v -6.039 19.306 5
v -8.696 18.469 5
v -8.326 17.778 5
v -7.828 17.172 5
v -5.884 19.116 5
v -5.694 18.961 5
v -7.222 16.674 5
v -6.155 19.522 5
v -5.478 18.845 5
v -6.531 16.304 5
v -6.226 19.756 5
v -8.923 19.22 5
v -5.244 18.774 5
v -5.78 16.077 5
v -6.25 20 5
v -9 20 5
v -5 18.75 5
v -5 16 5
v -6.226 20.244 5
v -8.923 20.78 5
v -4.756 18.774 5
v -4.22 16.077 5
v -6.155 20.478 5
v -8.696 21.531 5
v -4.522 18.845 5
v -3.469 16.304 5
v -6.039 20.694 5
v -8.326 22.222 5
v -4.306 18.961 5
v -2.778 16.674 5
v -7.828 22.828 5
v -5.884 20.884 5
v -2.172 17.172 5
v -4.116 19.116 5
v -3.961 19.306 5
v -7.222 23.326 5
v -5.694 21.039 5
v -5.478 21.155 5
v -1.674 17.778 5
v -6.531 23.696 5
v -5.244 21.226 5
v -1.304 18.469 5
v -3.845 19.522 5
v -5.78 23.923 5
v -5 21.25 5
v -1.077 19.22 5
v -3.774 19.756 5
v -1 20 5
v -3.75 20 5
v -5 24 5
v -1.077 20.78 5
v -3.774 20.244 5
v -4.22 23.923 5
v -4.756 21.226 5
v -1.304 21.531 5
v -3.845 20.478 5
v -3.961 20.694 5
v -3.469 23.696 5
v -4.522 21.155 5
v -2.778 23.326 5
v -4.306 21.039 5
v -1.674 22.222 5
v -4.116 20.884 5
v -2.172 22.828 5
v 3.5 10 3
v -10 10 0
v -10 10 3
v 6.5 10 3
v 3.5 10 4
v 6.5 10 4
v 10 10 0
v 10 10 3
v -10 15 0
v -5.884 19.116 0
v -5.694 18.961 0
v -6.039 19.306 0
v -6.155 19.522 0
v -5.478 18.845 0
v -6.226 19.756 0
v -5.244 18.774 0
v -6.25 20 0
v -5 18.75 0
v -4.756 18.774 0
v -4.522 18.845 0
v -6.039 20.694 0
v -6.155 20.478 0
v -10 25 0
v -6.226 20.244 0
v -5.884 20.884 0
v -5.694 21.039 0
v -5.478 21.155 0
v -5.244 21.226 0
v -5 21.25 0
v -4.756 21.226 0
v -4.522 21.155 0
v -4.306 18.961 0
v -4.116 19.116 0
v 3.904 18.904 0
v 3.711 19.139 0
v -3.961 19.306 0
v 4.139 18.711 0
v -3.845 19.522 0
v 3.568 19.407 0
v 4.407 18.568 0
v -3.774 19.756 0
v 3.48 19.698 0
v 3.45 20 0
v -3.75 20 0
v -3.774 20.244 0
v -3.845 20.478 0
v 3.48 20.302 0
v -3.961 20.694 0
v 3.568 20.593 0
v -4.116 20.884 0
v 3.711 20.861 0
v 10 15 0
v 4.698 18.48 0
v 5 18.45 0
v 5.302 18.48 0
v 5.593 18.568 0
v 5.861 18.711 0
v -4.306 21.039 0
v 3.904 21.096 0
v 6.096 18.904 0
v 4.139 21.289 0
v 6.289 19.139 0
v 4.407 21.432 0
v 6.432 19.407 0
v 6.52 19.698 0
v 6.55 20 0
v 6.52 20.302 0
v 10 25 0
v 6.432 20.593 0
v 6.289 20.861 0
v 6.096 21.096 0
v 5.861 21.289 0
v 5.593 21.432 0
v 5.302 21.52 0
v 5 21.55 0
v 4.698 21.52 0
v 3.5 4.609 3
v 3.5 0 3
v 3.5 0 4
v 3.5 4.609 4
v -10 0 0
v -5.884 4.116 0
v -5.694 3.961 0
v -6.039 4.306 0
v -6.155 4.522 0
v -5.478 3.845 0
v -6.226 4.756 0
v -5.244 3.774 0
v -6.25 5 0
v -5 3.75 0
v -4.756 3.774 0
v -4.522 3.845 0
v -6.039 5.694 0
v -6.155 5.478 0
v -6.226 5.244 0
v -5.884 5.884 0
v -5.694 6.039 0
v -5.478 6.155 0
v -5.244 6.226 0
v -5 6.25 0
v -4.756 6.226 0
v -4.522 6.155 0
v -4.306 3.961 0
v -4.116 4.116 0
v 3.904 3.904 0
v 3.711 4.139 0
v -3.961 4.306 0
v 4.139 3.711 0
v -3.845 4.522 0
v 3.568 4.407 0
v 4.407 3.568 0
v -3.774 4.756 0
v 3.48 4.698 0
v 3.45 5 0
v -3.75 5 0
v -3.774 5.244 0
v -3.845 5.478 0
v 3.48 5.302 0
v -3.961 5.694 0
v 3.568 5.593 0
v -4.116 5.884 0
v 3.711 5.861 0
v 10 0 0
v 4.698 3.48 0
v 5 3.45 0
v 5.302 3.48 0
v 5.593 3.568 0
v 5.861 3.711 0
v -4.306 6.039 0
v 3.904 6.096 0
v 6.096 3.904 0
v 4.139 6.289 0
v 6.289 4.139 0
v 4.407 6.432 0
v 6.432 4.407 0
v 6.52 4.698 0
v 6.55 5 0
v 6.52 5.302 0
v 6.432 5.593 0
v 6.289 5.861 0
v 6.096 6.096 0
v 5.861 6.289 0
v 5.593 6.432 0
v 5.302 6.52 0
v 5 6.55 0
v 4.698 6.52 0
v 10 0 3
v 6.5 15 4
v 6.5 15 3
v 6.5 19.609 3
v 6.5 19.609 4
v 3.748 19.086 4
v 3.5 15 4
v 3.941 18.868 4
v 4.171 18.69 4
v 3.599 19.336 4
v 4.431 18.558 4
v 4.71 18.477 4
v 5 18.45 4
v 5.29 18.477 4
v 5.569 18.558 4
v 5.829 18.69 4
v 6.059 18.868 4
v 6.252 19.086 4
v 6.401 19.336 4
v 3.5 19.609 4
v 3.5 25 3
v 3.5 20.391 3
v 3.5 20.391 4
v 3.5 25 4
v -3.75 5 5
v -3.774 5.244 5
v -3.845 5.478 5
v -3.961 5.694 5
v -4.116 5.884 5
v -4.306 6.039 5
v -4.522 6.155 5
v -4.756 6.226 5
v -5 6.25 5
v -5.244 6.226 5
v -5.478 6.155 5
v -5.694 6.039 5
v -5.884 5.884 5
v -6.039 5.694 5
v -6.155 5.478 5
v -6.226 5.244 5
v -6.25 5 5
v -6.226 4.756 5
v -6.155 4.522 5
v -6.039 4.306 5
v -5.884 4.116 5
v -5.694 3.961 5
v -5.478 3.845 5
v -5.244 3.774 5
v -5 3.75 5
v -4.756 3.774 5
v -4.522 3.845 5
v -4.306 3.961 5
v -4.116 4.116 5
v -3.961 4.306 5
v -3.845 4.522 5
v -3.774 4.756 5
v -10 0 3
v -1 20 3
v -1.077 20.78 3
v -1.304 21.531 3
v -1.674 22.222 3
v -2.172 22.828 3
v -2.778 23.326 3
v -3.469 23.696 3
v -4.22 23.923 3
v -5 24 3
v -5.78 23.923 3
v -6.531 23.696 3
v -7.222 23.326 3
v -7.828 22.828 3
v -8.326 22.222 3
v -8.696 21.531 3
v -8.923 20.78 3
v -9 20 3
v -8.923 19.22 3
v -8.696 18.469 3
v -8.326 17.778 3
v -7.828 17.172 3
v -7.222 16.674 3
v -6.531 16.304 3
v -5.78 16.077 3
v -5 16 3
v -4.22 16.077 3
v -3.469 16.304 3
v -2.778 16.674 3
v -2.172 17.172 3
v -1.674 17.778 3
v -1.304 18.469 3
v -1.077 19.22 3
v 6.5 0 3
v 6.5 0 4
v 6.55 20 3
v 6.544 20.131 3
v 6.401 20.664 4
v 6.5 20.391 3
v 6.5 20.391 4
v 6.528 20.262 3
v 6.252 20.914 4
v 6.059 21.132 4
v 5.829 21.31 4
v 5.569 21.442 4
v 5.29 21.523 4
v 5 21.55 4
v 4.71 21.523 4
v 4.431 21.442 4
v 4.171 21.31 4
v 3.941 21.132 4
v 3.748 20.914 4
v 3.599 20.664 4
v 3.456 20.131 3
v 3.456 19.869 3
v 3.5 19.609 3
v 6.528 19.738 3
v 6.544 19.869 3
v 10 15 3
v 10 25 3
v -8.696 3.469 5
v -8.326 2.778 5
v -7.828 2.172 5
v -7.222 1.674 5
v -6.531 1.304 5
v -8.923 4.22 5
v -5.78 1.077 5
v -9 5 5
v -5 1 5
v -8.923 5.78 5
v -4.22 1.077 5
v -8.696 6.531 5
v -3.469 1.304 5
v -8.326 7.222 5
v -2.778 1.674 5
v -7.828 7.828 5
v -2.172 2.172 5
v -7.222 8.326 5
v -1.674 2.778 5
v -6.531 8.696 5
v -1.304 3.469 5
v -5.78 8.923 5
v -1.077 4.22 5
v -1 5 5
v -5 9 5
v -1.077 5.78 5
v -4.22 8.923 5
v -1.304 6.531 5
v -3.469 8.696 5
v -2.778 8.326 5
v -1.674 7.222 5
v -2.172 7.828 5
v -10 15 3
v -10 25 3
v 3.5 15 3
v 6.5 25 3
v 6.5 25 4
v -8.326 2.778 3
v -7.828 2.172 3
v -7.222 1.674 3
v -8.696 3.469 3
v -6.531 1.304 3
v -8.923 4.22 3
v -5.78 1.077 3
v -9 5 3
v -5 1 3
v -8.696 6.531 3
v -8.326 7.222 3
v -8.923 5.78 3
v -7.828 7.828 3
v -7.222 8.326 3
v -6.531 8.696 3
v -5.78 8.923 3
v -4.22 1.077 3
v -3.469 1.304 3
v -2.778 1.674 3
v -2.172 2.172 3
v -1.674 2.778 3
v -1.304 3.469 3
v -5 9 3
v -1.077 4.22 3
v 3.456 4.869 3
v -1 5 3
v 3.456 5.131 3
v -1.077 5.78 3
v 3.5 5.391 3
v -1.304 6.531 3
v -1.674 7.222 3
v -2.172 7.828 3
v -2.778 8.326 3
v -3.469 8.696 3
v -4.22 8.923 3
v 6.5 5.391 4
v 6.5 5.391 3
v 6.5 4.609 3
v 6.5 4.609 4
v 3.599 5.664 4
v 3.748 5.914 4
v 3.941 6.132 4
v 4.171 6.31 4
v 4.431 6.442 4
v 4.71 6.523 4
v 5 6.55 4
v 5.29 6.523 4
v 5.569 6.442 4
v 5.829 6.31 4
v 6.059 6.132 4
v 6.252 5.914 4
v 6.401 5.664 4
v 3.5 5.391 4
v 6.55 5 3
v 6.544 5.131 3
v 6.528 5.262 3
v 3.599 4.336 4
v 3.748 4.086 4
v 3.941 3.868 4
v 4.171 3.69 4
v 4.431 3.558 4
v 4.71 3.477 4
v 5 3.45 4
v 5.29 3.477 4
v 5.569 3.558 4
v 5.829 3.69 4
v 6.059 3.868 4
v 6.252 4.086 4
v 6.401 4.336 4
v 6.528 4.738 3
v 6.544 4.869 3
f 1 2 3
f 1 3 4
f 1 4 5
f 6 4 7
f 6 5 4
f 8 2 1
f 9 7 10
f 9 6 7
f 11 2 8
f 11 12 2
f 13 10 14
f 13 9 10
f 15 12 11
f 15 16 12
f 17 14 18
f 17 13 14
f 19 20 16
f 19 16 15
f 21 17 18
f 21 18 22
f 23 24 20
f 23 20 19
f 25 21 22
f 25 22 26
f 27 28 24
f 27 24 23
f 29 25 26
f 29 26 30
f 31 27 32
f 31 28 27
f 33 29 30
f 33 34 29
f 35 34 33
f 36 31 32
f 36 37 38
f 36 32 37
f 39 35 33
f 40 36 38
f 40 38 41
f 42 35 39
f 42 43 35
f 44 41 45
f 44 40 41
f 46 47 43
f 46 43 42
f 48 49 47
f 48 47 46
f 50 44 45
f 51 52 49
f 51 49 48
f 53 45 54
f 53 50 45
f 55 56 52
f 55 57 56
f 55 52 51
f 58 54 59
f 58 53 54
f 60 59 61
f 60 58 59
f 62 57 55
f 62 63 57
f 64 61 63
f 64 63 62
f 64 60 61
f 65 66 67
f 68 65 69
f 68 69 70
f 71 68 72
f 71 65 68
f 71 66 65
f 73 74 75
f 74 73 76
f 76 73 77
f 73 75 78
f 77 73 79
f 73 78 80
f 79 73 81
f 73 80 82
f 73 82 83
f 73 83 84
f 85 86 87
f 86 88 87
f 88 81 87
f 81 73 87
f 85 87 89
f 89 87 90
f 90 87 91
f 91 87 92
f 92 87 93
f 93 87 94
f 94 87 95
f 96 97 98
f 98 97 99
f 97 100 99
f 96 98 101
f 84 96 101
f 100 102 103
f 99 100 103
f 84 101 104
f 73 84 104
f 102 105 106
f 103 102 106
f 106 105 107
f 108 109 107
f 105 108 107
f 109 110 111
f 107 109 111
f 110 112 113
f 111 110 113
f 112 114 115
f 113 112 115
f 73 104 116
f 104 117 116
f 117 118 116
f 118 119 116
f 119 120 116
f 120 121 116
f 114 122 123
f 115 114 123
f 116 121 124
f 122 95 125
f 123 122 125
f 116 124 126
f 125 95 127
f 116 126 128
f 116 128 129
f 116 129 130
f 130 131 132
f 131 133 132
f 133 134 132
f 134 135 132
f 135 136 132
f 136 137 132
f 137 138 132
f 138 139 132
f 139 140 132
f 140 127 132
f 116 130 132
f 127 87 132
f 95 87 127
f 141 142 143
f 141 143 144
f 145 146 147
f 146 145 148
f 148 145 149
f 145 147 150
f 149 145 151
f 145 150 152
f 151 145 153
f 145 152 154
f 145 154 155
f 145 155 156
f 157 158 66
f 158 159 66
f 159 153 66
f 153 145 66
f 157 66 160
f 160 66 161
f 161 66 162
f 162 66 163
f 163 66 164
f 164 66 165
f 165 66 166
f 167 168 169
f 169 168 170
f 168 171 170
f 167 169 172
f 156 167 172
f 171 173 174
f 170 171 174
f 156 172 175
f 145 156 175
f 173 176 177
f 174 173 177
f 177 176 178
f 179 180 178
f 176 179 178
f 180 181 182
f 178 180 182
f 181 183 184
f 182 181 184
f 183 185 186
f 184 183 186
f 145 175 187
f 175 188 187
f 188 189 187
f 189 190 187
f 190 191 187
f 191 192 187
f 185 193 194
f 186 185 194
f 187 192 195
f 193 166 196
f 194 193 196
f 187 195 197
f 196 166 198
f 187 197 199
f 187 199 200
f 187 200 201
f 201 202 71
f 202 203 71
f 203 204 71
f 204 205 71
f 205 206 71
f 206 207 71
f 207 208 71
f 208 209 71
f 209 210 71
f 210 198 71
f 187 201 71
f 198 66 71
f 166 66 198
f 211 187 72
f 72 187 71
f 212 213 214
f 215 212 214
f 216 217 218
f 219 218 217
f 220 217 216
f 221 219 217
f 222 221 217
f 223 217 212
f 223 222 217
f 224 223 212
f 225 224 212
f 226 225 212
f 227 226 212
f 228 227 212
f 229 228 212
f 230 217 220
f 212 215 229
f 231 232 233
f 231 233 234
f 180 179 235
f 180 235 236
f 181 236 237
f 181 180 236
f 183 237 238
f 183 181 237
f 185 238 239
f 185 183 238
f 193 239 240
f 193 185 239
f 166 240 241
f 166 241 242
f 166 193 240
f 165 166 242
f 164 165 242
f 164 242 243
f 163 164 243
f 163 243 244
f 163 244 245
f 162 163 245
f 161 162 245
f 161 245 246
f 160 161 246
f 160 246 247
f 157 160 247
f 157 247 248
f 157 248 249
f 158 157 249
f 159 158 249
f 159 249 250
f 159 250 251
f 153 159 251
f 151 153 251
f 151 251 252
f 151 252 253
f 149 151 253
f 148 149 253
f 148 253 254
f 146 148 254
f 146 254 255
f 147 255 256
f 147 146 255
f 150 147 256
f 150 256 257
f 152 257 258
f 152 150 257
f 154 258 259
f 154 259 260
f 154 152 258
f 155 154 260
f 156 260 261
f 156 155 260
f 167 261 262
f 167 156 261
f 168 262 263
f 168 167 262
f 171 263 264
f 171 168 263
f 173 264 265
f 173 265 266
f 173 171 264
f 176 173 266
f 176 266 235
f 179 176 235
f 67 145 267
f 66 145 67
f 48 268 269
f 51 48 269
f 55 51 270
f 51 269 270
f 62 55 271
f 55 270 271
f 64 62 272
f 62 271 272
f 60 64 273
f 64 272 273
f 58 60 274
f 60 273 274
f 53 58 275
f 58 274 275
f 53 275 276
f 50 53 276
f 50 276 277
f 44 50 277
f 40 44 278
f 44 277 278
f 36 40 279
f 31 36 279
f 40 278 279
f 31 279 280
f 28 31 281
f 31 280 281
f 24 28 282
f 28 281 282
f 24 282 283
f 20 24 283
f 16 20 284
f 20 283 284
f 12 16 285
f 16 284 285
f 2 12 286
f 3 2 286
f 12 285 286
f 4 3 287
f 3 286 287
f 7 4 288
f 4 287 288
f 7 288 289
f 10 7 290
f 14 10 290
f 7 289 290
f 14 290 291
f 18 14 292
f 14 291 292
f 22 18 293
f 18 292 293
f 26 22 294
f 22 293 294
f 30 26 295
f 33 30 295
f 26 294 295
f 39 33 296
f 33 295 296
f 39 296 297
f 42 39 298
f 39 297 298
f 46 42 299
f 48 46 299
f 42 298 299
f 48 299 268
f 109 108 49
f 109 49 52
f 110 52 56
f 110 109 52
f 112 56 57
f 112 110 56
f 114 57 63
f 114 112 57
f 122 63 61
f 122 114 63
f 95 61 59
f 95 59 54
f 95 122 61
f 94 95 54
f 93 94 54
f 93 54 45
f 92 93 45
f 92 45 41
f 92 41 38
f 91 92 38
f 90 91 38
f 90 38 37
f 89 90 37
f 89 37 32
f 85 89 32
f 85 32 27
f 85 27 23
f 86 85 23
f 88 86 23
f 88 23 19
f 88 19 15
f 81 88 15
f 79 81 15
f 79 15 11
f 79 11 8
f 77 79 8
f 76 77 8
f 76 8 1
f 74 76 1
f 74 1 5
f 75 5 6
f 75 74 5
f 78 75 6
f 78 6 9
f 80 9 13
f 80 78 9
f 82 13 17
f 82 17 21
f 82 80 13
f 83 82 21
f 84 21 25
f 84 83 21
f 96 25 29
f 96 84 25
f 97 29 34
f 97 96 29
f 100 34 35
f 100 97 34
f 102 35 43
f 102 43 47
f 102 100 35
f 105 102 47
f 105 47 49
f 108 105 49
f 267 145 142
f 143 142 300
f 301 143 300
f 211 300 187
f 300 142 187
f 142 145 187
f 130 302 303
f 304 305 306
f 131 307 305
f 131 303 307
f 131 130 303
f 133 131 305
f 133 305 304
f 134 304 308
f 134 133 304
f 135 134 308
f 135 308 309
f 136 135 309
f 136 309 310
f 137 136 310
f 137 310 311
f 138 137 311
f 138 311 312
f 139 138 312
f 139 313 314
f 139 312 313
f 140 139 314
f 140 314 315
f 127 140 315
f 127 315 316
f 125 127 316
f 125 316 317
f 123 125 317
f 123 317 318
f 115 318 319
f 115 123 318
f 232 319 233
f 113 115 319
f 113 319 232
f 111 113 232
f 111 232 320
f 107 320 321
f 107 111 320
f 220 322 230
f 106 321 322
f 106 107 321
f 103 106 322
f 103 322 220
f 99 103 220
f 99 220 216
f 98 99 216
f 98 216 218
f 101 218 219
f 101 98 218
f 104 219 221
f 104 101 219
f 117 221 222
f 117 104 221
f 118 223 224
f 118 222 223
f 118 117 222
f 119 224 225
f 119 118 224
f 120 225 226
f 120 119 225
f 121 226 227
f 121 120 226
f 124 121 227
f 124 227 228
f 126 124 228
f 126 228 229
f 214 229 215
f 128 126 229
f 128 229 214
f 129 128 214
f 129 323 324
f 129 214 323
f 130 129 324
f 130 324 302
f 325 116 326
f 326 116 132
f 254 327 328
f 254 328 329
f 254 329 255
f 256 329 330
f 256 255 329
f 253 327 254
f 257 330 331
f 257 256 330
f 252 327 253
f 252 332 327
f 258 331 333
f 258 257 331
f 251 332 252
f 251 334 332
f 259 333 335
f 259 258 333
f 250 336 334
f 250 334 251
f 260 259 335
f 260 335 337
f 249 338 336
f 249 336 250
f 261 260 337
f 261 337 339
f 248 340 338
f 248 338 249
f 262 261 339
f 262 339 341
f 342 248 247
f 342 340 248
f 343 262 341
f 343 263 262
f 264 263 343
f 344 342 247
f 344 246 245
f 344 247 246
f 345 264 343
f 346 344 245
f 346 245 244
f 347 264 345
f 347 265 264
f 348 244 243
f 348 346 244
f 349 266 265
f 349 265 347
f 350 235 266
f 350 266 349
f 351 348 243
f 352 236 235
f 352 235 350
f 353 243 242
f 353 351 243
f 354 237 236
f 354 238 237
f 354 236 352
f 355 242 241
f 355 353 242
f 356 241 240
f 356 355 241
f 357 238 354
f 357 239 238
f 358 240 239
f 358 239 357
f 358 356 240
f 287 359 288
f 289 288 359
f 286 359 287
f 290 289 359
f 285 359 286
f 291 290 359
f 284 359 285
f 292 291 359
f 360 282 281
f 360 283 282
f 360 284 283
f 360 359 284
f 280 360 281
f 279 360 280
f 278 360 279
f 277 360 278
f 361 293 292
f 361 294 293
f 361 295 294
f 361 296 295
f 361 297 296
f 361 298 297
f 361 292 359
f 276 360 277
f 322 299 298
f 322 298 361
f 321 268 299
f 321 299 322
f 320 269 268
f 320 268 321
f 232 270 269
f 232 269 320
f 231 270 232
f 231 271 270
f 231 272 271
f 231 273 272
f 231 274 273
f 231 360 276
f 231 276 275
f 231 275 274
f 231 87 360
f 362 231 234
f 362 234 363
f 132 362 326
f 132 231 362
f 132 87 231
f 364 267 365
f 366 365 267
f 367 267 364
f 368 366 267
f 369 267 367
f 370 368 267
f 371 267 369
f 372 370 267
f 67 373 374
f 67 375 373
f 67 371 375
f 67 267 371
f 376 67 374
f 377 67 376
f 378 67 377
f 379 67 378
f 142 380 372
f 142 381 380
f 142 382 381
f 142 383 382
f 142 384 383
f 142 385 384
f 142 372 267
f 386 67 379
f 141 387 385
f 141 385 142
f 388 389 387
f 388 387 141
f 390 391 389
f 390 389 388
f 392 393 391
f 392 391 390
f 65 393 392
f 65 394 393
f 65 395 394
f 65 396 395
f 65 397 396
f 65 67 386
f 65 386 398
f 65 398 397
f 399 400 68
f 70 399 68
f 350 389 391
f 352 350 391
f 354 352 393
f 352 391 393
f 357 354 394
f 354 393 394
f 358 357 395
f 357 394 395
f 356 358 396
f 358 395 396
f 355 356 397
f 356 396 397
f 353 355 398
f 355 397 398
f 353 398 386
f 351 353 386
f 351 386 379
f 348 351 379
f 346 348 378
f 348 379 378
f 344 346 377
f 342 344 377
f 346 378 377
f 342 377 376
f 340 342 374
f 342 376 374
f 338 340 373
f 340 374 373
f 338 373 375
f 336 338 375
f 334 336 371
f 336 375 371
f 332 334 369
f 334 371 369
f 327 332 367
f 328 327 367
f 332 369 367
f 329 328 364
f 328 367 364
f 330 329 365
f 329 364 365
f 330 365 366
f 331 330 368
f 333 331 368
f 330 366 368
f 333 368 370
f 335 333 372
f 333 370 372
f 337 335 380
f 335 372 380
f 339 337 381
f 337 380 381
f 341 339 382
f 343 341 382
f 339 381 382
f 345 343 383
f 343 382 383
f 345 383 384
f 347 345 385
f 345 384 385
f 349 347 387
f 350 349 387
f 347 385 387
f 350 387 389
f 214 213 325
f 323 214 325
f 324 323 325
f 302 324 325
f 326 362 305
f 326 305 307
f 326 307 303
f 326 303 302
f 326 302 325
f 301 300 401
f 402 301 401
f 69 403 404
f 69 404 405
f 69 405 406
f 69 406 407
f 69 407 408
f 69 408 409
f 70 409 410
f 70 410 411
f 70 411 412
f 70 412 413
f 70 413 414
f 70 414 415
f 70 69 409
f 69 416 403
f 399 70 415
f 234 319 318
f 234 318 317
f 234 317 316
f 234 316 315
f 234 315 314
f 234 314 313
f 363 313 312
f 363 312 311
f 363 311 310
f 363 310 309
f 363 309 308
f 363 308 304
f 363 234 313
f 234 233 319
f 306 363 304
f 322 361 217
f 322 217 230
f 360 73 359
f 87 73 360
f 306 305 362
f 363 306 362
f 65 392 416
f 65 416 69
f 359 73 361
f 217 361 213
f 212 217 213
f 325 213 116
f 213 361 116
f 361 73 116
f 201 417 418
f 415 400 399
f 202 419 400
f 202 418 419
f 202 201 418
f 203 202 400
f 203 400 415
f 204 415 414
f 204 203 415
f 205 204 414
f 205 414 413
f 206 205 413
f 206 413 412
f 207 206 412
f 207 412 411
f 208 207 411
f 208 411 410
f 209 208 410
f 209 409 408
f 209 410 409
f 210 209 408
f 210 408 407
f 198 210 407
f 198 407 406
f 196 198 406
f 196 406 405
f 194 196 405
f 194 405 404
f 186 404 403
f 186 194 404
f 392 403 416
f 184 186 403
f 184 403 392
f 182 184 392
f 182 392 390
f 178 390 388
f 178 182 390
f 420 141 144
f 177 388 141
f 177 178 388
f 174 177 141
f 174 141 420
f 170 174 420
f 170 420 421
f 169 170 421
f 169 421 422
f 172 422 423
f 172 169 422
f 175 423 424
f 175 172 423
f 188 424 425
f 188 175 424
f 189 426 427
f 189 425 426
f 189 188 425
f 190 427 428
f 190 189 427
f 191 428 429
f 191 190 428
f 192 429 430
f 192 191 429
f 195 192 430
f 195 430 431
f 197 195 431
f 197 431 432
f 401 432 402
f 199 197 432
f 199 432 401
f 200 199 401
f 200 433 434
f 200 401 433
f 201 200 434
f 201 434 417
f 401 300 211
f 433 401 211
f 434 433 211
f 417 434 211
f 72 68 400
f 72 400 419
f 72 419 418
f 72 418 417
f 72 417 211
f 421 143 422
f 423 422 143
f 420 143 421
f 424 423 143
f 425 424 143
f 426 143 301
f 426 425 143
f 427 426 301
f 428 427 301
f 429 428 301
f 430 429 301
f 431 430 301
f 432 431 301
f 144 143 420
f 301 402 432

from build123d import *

# Parameters (mm, degrees)
SKETCH1_W           = 20
SKETCH1_H           = 10
BOSS_EXTRUDE1_DEPTH = 3
SKETCH2_R           = 4
SKETCH2_R_2         = 1.25
BOSS_EXTRUDE2_DEPTH = 2
SKETCH3_W           = 3
SKETCH3_H           = 10
BOSS_EXTRUDE3_DEPTH = 1
SKETCH4_R           = 1.25
SKETCH4_R_2         = 1.55
CUT_EXTRUDE1_DEPTH  = 6
LPATTERN1_COUNT     = 2
LPATTERN1_PITCH     = 15


with BuildPart() as part:
    # Sketch1 → Boss-Extrude1 (new body)
    with BuildSketch(Plane.XY):
        with Locations((0, 5)):
            Rectangle(SKETCH1_W, SKETCH1_H)
    extrude(amount=BOSS_EXTRUDE1_DEPTH)

    # Sketch2 → Boss-Extrude2 (add)
    with BuildSketch(Plane.XY.offset(3)):
        with Locations((-5, 5)):
            Circle(SKETCH2_R)
        with Locations((-5, 5)):
            Circle(SKETCH2_R_2, mode=Mode.SUBTRACT)
    extrude(amount=BOSS_EXTRUDE2_DEPTH)

    # Sketch3 → Boss-Extrude3 (add)
    with BuildSketch(Plane.XY.offset(3)):
        with Locations((5, 5)):
            Rectangle(SKETCH3_W, SKETCH3_H)
    extrude(amount=BOSS_EXTRUDE3_DEPTH)

    # Sketch4 → Cut-Extrude1 (cut, through all)
    with BuildSketch(Plane.XY):
        with Locations((-5, 5)):
            Circle(SKETCH4_R)
        with Locations((5, 5)):
            Circle(SKETCH4_R_2)
    extrude(amount=CUT_EXTRUDE1_DEPTH, mode=Mode.SUBTRACT)


with BuildPart() as lpattern1_1:
    # LPattern1: pattern copy
    add(part.part.moved(Location(Vector(0, 1, 0) * (1 * LPATTERN1_PITCH))))


solid = Compound([part.part, lpattern1_1.part])
